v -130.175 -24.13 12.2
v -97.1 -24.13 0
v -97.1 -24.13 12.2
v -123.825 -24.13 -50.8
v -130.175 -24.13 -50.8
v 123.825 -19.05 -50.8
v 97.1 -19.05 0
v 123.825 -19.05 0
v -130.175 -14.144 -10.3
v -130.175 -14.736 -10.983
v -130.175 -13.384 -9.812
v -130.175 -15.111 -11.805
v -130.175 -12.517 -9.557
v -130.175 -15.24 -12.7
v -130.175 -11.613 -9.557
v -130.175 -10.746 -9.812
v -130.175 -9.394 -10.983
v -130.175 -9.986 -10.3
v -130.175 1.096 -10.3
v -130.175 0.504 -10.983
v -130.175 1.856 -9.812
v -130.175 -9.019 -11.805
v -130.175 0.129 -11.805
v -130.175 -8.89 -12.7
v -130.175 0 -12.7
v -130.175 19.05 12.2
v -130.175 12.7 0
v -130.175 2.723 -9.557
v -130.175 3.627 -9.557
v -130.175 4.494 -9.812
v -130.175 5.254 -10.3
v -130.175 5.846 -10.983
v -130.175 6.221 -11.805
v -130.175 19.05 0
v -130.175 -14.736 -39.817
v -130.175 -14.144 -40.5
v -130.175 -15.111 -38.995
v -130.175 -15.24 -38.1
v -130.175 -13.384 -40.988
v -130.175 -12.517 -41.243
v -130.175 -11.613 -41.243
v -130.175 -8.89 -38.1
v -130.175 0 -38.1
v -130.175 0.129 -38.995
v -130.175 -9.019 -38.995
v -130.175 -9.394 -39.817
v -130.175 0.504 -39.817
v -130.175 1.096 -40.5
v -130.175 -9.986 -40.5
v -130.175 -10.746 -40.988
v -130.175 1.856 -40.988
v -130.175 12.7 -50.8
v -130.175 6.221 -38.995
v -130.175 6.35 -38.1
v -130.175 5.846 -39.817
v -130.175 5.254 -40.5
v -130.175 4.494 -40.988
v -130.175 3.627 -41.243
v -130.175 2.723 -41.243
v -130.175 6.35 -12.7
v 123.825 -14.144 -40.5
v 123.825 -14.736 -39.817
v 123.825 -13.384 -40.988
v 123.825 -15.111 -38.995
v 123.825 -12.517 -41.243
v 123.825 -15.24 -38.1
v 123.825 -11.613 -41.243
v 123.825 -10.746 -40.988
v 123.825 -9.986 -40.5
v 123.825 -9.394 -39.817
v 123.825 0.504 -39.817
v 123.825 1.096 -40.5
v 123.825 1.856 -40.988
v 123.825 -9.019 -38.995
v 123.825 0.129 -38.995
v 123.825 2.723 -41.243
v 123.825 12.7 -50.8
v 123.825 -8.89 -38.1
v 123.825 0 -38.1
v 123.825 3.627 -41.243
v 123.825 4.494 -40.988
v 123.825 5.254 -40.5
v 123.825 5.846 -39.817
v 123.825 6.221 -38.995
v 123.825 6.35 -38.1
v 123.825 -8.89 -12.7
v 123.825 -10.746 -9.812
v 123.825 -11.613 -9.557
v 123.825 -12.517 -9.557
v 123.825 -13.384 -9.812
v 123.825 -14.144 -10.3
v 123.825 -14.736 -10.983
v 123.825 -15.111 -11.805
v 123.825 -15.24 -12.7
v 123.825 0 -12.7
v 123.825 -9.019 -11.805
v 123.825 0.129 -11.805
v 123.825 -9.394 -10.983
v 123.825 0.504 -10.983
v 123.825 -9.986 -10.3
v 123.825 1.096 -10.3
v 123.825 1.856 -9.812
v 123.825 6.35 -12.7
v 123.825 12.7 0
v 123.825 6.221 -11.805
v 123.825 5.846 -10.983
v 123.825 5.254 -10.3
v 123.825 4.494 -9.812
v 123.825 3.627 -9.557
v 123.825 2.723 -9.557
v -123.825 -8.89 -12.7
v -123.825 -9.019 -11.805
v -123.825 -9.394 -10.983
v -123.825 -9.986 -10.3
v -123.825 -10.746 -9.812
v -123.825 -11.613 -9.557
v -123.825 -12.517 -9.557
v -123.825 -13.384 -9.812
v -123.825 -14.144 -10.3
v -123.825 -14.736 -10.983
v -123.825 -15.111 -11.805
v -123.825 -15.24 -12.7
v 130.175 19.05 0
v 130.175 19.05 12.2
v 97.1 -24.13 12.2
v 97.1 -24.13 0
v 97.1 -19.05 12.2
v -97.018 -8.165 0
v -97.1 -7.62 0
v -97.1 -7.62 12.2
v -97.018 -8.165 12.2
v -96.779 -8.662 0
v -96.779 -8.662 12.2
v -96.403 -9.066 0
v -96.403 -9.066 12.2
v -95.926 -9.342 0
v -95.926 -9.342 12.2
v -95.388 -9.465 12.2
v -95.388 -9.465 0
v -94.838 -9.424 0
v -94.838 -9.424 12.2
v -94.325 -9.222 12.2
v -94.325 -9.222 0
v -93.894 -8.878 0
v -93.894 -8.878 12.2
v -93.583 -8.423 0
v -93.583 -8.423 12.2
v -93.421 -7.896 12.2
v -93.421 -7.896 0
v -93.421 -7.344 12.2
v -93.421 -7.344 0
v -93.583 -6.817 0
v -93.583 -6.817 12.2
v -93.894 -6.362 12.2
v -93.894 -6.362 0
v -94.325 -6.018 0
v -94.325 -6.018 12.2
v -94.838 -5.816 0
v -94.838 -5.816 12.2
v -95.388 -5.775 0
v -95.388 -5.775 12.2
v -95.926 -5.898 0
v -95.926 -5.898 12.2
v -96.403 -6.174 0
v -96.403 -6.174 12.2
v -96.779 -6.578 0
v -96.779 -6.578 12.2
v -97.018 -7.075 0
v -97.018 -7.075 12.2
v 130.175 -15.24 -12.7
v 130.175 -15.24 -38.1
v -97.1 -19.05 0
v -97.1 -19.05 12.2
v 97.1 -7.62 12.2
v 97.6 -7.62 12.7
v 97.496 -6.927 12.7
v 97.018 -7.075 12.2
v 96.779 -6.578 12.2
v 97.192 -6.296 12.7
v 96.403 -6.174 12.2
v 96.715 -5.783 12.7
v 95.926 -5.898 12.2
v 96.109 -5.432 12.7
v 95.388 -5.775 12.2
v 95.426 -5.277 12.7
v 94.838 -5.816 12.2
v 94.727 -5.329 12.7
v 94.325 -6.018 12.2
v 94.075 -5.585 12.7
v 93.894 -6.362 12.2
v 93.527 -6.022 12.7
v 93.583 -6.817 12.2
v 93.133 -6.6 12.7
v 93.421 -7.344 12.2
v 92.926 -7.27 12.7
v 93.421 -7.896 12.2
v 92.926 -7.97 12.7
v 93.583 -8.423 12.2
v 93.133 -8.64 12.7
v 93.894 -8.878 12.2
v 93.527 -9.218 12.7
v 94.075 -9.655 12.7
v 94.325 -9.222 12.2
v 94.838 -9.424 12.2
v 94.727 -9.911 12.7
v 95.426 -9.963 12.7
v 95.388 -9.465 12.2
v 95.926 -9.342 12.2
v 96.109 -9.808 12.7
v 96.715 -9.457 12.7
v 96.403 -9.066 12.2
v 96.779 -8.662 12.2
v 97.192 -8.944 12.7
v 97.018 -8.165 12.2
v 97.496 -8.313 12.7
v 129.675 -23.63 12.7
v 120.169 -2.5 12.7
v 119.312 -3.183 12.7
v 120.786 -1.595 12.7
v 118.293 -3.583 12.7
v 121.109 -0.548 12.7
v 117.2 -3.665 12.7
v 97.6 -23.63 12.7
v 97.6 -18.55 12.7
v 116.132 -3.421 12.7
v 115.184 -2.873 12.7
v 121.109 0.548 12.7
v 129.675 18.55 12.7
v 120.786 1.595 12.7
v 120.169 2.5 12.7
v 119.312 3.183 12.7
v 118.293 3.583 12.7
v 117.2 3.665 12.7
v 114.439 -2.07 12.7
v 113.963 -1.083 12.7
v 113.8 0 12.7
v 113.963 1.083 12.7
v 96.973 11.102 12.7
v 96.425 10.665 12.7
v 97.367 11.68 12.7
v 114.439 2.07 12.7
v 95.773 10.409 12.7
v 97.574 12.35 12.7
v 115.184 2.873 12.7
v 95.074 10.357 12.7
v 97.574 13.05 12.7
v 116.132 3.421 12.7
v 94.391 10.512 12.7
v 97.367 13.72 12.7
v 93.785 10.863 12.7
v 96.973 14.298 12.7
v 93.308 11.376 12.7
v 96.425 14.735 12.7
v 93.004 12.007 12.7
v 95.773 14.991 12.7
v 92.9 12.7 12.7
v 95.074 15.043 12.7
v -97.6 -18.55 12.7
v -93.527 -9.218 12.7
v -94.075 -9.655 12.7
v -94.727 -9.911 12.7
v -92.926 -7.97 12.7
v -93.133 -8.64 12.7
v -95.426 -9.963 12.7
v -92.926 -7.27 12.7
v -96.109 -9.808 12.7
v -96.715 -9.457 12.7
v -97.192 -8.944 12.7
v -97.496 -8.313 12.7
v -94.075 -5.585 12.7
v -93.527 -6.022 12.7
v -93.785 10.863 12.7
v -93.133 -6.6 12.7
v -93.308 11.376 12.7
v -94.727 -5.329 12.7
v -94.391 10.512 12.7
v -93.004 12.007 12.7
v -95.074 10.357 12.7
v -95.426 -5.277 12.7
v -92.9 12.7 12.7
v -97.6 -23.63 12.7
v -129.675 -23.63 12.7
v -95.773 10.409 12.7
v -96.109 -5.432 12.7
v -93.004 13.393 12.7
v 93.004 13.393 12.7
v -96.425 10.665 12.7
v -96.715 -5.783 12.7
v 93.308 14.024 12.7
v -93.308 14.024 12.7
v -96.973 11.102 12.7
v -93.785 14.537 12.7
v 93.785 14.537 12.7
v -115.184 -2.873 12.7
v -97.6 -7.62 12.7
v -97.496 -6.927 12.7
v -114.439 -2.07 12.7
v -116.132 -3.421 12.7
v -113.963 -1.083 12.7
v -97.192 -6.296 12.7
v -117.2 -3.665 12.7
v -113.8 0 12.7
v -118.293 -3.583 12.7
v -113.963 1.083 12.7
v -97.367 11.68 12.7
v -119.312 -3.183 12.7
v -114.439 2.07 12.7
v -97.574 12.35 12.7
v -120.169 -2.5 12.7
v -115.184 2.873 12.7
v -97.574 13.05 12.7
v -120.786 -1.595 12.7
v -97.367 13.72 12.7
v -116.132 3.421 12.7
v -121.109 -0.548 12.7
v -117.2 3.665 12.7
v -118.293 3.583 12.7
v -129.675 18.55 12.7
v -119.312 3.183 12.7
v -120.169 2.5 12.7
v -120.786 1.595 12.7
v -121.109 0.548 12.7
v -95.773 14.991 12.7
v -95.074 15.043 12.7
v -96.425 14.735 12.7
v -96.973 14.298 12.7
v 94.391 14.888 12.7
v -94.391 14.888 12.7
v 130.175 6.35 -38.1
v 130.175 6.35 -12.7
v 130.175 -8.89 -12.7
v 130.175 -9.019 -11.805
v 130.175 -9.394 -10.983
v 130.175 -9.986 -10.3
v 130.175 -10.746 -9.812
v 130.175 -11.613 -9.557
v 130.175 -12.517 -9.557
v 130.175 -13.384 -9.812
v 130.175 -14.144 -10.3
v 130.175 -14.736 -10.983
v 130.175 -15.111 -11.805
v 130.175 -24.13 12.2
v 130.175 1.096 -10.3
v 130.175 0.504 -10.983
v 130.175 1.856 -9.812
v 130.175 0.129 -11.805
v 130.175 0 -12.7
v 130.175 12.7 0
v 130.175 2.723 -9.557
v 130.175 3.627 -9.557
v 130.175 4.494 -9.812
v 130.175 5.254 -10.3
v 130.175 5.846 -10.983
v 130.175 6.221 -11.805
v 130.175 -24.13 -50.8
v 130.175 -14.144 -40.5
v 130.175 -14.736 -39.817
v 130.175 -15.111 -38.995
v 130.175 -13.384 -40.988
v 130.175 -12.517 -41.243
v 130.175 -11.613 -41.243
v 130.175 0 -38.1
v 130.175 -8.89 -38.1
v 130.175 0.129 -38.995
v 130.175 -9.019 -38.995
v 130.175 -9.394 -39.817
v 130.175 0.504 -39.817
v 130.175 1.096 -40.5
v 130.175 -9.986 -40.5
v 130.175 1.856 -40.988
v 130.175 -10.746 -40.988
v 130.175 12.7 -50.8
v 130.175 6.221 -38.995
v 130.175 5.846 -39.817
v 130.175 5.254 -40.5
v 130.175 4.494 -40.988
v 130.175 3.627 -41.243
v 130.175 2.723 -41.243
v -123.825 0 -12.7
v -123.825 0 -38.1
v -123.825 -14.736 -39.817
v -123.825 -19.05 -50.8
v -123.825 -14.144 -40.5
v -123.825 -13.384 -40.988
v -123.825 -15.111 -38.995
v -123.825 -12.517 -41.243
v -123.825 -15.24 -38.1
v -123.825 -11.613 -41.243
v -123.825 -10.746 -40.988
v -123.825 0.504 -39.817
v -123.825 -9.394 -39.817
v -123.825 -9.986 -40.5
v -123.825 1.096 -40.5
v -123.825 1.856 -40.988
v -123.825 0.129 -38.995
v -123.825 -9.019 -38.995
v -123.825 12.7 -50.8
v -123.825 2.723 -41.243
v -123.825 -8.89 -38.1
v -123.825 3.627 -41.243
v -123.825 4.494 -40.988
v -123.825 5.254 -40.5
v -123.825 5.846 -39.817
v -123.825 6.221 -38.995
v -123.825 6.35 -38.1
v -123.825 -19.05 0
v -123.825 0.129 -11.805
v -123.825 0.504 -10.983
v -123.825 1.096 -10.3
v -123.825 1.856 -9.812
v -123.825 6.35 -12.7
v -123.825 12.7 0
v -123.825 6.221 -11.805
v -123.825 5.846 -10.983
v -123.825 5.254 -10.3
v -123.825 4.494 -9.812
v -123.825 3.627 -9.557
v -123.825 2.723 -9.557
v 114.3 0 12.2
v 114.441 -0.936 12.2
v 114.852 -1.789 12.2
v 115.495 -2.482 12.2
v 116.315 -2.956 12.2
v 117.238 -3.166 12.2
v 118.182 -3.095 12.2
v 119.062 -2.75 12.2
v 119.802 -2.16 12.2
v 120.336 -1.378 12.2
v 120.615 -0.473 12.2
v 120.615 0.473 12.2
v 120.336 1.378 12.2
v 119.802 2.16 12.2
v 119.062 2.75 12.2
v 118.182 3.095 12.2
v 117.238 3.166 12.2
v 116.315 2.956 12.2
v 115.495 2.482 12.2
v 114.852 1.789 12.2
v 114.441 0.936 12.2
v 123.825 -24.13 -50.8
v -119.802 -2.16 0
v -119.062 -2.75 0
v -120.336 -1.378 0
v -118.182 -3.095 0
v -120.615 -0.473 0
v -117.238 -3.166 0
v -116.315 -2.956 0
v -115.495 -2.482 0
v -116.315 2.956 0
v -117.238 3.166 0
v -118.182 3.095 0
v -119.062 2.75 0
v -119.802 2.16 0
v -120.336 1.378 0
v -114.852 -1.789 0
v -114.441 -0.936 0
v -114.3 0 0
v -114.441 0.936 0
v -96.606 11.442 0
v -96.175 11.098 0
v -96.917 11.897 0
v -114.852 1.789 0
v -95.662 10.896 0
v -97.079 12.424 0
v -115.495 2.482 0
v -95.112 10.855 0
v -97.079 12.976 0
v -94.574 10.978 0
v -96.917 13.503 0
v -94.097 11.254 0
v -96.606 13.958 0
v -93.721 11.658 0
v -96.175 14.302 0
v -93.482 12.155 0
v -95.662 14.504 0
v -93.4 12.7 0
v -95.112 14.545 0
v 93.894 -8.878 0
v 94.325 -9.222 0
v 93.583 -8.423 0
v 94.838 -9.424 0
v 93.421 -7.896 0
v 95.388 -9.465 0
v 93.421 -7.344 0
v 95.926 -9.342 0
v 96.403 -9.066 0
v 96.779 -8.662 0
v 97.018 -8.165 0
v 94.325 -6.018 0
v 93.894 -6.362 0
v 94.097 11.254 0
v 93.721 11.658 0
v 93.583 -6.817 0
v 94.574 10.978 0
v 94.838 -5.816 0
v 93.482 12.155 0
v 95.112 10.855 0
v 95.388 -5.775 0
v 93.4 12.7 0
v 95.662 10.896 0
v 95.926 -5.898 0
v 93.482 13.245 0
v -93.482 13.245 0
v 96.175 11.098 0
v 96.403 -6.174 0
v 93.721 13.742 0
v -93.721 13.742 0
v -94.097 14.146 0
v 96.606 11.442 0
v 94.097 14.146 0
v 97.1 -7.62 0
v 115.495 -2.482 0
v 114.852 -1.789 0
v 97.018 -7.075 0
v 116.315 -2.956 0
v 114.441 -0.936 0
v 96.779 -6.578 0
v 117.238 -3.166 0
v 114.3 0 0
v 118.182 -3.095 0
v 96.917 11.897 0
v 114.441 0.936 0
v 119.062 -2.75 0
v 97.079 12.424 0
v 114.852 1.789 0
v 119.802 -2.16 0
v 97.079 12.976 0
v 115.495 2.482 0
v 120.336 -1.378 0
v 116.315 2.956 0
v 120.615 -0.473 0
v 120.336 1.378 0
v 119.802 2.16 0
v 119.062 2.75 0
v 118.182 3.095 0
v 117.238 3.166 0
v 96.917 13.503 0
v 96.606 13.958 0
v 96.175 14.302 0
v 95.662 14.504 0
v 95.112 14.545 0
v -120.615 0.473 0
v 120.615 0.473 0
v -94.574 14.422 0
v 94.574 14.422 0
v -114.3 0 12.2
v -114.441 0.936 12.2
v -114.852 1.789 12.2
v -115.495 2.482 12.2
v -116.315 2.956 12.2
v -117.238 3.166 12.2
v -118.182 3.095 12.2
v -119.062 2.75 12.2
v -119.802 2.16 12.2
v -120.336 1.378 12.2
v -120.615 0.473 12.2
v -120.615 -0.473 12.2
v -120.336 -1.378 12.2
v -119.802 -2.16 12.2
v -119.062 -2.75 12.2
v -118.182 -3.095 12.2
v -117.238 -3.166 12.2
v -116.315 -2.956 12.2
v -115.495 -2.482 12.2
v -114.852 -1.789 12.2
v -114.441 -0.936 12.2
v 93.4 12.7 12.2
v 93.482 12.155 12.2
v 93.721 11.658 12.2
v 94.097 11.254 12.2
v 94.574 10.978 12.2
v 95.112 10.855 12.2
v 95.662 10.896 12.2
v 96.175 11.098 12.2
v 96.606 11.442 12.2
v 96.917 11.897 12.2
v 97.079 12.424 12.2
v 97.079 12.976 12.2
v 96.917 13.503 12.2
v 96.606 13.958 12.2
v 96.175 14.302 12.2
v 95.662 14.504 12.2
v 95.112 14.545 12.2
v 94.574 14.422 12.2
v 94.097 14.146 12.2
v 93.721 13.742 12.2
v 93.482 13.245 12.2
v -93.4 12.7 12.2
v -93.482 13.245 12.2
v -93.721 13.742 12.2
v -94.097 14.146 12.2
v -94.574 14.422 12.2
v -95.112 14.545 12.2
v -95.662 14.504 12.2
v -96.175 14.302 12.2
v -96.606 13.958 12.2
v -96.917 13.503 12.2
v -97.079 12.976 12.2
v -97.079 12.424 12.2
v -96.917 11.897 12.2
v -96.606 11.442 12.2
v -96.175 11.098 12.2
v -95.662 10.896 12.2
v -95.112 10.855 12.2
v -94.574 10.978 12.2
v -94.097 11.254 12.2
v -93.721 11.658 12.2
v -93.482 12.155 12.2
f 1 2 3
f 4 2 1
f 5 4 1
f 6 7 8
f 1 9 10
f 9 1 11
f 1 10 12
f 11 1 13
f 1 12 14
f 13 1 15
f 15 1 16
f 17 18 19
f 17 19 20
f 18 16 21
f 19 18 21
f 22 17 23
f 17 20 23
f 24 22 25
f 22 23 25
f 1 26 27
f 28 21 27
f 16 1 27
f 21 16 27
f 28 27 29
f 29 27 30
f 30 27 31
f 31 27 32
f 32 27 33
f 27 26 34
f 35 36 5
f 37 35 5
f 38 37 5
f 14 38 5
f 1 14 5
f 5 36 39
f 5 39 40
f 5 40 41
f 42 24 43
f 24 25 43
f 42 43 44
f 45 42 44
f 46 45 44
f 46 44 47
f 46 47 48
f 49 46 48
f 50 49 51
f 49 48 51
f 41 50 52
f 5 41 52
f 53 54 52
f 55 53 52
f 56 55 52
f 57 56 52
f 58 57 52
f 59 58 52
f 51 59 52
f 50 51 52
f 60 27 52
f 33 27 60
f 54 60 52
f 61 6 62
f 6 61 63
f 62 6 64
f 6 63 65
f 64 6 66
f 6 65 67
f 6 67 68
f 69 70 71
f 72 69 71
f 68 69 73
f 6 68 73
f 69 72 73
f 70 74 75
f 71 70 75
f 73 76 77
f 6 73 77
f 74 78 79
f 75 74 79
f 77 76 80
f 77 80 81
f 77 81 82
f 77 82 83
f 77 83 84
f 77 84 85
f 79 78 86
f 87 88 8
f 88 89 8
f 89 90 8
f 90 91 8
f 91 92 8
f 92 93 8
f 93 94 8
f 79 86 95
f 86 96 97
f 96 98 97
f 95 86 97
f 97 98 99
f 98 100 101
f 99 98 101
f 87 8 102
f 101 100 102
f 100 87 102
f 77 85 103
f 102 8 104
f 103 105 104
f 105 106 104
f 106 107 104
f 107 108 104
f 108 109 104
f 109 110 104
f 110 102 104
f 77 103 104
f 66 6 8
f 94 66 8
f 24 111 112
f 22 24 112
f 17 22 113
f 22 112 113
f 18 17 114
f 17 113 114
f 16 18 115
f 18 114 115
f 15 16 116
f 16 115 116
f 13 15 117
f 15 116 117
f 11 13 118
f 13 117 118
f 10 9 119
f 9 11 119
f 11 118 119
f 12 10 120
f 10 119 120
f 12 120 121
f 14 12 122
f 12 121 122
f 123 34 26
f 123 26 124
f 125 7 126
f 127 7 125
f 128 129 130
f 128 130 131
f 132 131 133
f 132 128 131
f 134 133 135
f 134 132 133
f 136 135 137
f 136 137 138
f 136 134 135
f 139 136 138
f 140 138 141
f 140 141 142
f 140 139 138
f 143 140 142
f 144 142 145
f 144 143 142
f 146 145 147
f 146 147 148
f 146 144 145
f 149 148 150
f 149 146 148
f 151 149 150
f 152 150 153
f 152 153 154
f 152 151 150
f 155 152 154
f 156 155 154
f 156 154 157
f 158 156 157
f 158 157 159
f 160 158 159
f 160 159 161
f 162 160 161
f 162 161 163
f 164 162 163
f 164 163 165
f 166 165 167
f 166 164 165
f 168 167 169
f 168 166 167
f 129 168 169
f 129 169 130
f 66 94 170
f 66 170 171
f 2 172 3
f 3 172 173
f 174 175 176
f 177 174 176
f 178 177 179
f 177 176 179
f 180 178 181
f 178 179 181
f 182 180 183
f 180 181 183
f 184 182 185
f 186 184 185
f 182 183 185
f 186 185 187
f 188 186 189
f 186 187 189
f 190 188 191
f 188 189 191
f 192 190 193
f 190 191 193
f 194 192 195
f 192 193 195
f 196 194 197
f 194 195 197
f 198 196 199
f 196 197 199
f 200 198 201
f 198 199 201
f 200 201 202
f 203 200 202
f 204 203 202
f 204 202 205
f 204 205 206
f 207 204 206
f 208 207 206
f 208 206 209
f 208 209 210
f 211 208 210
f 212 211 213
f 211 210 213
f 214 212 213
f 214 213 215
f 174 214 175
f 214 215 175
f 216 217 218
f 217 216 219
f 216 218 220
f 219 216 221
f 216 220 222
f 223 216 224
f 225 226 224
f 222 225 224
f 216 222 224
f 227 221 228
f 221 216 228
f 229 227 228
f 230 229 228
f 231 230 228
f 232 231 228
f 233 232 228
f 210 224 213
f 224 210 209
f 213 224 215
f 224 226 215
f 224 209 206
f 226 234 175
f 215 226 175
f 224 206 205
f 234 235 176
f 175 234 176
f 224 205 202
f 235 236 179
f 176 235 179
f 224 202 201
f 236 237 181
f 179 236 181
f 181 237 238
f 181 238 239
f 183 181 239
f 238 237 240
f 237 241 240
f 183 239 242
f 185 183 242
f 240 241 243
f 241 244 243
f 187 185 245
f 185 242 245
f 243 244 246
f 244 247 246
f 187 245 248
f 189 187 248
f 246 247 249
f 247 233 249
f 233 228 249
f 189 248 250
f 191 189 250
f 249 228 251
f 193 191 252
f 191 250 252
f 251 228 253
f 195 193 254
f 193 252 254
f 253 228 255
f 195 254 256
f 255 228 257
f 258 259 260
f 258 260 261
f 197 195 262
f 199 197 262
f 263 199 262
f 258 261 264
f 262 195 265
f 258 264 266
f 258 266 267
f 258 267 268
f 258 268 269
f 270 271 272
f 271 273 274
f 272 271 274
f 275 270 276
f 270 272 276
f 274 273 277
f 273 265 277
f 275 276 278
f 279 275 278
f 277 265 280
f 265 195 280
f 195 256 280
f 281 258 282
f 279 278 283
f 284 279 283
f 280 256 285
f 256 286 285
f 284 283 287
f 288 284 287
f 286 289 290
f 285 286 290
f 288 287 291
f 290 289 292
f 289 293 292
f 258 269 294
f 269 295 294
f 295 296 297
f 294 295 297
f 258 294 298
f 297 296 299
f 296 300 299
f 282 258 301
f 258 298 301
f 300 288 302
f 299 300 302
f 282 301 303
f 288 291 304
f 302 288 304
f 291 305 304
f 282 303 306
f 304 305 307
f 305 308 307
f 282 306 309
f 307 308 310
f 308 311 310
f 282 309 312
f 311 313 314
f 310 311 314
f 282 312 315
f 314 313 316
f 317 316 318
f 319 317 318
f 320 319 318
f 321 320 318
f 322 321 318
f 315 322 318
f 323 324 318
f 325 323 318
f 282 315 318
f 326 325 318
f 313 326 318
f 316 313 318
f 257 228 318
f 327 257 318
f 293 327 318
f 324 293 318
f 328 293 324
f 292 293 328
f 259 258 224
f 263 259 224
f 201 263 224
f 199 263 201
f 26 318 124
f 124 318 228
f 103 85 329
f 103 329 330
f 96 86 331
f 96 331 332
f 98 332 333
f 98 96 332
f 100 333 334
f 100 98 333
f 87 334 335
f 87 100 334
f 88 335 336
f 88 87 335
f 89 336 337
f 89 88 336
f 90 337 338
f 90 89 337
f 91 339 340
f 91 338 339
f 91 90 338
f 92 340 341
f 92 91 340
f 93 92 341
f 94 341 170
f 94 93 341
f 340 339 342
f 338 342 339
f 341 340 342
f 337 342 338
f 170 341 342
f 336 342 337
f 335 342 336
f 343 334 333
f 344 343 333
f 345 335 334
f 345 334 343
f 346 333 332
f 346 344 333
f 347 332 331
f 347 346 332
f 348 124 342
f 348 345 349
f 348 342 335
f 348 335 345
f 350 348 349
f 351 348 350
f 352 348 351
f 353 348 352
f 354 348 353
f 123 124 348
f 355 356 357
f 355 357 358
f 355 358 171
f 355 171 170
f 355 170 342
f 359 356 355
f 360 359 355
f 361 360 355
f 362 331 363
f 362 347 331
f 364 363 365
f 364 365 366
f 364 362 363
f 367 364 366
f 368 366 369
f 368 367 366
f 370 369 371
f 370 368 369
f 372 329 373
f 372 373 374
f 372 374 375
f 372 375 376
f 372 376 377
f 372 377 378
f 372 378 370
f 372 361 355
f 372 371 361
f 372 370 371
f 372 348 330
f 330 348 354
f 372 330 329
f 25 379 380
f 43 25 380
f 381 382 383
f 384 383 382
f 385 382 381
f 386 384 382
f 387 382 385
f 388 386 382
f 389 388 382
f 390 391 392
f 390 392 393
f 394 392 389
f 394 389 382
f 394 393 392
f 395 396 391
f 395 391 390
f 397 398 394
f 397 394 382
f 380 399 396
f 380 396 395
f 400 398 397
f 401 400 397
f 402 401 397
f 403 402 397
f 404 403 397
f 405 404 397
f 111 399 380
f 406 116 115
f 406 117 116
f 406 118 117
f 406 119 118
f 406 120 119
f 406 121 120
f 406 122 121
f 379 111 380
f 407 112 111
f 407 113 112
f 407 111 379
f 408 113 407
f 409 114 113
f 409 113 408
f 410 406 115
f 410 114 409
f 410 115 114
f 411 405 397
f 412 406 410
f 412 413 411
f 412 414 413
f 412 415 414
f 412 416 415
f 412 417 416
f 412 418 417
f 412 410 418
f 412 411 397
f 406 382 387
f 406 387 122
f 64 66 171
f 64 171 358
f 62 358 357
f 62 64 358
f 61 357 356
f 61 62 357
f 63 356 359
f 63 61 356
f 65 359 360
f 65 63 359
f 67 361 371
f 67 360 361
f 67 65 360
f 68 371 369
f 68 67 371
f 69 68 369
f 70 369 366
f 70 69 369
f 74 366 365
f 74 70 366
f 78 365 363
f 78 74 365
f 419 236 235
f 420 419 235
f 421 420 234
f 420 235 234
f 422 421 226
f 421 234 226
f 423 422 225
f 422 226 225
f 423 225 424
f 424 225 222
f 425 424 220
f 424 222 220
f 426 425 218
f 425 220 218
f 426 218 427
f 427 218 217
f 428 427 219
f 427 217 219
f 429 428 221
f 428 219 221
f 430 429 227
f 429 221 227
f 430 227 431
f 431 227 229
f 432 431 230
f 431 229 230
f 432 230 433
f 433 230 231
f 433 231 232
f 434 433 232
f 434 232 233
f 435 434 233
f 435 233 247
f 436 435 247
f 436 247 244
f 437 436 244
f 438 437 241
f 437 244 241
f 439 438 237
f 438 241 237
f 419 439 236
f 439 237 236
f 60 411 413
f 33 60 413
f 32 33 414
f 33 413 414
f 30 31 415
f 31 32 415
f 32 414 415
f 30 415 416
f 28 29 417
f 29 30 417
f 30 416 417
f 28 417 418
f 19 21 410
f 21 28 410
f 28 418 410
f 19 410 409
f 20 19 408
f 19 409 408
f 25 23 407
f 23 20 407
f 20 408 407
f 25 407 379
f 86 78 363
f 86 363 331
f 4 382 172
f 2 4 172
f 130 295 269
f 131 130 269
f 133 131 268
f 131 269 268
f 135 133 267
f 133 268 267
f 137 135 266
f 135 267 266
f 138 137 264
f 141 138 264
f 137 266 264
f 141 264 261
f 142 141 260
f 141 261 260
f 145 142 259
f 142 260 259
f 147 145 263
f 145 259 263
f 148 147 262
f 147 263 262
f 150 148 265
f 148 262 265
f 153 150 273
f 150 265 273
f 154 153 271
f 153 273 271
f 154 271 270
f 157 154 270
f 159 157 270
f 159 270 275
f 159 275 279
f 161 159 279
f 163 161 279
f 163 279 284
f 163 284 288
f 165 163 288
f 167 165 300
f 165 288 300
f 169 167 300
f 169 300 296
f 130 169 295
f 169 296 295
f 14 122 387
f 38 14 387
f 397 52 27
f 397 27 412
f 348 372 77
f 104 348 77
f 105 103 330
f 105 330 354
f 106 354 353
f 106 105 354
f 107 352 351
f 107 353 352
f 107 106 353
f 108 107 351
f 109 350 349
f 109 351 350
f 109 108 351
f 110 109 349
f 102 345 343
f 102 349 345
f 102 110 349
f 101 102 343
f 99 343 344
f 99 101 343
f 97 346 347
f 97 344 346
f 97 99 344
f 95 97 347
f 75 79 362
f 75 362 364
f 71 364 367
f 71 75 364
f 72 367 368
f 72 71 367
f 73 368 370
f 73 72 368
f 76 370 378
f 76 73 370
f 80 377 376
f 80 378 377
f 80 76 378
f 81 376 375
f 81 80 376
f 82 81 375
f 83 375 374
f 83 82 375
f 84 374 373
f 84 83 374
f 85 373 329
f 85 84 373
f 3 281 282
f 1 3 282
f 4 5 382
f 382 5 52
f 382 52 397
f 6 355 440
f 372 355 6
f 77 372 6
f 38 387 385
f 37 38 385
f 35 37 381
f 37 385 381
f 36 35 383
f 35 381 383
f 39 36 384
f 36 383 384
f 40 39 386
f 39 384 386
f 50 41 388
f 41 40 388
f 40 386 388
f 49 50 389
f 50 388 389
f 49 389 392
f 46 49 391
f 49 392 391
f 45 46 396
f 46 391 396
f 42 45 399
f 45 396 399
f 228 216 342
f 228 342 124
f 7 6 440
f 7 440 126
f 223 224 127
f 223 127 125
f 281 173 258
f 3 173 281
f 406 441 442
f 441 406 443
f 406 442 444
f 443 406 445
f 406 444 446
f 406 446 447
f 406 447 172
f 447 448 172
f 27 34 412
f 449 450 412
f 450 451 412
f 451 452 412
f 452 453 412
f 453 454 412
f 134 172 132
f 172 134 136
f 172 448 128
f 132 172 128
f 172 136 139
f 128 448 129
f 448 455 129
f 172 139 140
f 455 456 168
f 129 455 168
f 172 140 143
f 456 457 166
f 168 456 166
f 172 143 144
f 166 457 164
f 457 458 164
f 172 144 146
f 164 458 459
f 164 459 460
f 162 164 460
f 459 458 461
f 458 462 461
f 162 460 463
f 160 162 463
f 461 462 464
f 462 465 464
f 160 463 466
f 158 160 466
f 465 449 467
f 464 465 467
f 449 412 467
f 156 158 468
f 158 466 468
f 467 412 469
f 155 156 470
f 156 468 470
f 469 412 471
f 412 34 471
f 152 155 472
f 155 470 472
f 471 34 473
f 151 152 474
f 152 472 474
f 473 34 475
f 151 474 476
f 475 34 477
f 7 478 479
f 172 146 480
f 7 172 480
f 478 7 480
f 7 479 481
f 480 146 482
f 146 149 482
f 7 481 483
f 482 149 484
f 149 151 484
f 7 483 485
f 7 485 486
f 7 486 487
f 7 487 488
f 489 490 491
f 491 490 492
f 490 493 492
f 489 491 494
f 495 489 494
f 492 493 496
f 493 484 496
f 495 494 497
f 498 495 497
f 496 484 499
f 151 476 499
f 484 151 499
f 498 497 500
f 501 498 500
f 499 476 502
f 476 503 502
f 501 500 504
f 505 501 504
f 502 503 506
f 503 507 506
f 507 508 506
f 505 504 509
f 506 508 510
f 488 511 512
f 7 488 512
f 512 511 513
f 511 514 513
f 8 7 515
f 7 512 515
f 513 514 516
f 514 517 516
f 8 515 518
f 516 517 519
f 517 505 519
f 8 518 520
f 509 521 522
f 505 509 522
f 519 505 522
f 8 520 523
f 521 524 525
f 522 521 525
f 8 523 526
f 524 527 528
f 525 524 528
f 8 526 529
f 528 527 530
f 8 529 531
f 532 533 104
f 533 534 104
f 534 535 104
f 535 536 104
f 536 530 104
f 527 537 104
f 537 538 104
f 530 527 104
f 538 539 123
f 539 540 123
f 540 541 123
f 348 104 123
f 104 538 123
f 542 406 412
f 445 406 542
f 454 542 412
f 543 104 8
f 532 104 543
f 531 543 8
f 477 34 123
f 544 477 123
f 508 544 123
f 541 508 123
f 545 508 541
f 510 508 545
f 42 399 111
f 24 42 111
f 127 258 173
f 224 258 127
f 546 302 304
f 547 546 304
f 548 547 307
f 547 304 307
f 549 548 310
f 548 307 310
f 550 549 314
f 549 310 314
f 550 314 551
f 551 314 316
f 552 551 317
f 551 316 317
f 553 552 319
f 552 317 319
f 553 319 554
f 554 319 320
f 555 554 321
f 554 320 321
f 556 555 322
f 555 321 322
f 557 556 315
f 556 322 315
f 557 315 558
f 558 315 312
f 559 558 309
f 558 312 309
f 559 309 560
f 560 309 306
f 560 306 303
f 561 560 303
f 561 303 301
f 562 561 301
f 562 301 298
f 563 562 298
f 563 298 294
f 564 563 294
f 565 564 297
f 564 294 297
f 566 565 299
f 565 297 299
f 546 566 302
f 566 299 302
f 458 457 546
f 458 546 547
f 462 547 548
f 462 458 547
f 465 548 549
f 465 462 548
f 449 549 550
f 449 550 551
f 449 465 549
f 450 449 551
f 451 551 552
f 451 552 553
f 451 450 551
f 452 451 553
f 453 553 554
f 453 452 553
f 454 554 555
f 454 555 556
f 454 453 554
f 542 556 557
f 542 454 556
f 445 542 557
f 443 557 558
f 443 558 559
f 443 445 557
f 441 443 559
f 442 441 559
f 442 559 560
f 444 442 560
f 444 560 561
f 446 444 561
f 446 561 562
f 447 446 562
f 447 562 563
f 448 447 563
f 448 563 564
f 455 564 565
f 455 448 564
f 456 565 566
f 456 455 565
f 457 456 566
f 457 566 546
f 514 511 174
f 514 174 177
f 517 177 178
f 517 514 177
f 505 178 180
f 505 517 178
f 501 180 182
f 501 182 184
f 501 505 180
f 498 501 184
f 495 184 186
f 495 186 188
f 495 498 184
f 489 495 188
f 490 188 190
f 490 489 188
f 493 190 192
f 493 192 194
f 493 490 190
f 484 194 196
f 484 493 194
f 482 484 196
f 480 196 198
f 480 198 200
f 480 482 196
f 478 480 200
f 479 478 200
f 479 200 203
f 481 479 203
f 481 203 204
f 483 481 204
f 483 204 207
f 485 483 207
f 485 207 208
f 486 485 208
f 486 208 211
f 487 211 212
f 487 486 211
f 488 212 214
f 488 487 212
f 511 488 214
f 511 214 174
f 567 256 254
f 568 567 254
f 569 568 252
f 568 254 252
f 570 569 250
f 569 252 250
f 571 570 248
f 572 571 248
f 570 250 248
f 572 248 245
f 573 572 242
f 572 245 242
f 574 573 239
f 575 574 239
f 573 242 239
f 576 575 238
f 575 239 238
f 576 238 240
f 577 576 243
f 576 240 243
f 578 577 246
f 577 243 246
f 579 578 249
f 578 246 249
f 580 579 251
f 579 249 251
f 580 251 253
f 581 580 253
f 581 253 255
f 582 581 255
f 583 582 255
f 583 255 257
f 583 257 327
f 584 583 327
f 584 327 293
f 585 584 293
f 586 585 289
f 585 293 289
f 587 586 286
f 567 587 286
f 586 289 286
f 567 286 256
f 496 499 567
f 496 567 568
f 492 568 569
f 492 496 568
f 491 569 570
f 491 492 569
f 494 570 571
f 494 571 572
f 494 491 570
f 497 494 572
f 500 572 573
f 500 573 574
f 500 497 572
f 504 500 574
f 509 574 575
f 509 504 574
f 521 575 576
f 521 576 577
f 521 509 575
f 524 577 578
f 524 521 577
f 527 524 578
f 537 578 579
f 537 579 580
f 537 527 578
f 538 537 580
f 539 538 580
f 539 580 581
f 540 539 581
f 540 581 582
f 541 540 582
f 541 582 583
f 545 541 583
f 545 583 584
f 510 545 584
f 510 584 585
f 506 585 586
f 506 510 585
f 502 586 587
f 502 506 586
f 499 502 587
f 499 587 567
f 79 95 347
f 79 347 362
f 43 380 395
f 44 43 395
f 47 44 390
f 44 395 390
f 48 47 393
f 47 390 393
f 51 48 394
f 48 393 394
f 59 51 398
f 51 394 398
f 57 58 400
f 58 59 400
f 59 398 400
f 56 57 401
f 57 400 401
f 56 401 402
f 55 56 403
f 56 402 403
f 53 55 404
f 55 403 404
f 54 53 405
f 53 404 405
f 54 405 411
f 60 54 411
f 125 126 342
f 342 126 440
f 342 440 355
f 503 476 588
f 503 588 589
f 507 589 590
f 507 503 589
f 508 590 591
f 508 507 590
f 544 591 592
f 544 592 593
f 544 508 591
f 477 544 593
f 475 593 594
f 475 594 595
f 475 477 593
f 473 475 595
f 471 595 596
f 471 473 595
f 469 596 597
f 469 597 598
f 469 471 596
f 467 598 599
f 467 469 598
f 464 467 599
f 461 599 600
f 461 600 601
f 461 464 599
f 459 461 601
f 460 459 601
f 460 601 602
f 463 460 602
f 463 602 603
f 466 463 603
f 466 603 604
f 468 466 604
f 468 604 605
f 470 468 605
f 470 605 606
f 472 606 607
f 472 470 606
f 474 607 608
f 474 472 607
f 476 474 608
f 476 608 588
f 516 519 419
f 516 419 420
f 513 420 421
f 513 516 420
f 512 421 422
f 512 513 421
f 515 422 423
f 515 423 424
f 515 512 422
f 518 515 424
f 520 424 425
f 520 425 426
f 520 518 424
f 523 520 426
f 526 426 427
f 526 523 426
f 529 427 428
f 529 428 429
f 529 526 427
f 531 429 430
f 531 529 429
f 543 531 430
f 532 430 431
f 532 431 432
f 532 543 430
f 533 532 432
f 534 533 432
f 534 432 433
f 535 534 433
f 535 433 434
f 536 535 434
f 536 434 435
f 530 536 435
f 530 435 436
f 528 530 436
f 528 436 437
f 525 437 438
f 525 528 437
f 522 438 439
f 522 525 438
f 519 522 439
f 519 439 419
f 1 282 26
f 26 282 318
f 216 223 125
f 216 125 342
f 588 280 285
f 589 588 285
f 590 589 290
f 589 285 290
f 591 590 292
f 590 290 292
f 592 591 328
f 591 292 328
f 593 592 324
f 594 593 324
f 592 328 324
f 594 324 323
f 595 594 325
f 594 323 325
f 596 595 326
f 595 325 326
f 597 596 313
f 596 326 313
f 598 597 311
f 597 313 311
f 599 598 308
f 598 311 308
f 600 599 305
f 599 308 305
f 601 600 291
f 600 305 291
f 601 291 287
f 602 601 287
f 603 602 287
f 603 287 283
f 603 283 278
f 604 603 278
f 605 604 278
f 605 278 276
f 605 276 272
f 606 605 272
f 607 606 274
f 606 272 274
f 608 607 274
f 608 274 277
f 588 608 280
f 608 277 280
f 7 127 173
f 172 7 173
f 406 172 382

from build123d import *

# Parameters (mm, degrees)
SKETCH1_W           = 260.35
SKETCH1_H           = 38.1
SKETCH1_R           = 3.175
SKETCH1_R_2         = 1.85
BOSS_EXTRUDE1_DEPTH = 12.7
SKETCH2_W           = 6.35
SKETCH2_H           = 31.75
BOSS_EXTRUDE2_DEPTH = 50.8
CUT_EXTRUDE1_DEPTH  = 50.8
BOSS_EXTRUDE3_DEPTH = 5.08
CHAMFER1_SIZE       = 0.5


with BuildPart() as part:
    # Sketch1 → Boss-Extrude1 (new body)
    with BuildSketch(Plane.XY):
        Rectangle(SKETCH1_W, SKETCH1_H)
        with Locations((-117.475, 0)):
            Circle(SKETCH1_R, mode=Mode.SUBTRACT)
        with Locations((117.475, 0)):
            Circle(SKETCH1_R, mode=Mode.SUBTRACT)
        with Locations((-95.25, 12.7)):
            Circle(SKETCH1_R_2, mode=Mode.SUBTRACT)
        with Locations((-95.25, -7.62)):
            Circle(SKETCH1_R_2, mode=Mode.SUBTRACT)
        with Locations((95.25, -7.62)):
            Circle(SKETCH1_R_2, mode=Mode.SUBTRACT)
        with Locations((95.25, 12.7)):
            Circle(SKETCH1_R_2, mode=Mode.SUBTRACT)
    boss_extrude1 = extrude(amount=BOSS_EXTRUDE1_DEPTH)

    # Sketch2 → Boss-Extrude2 (add)
    with BuildSketch(Plane(origin=(0, 0, 0), x_dir=(-1, 0, 0), z_dir=(0, 0, -1))):
        with Locations((-127, -3.175)):
            Rectangle(SKETCH2_W, SKETCH2_H)
    boss_extrude2 = extrude(amount=BOSS_EXTRUDE2_DEPTH)

    # Sketch3 → Cut-Extrude1 (cut)
    with BuildSketch(Plane.ZY.offset(-123.825)):
        with BuildLine():
            Line((-38.1, 6.35), (-12.7, 6.35))
            ThreePointArc((-12.7, 6.35), (-9.525, 3.175), (-12.7, 0))
            Line((-12.7, 0), (-38.1, 0))
            ThreePointArc((-38.1, 0), (-41.275, 3.175), (-38.1, 6.35))
        make_face()
        with BuildLine():
            Line((-38.1, -8.89), (-12.7, -8.89))
            ThreePointArc((-12.7, -8.89), (-9.525, -12.065), (-12.7, -15.24))
            Line((-12.7, -15.24), (-38.1, -15.24))
            ThreePointArc((-38.1, -15.24), (-41.275, -12.065), (-38.1, -8.89))
        make_face()
    cut_extrude1 = extrude(amount=-CUT_EXTRUDE1_DEPTH, mode=Mode.SUBTRACT)

    # Sketch4 → Boss-Extrude3 (add)
    with BuildSketch(Plane(origin=(0, -19.05, 0), x_dir=(-1, 0, 0), z_dir=(0, -1, 0))):
        Polygon((-123.825, 50.8), (-97.1, 0), (-97.1, -12.7), (-130.175, -12.7), (-130.175, 50.8), align=None)
    boss_extrude3 = extrude(amount=BOSS_EXTRUDE3_DEPTH)

    # Mirror1: Boss-Extrude1, Boss-Extrude2, Cut-Extrude1, Boss-Extrude3 across plane
    add(boss_extrude1.mirror(Plane(origin=(0, 0, 0), x_dir=(0, 0, 1), z_dir=(1, 0, 0))))
    add(boss_extrude2.mirror(Plane(origin=(0, 0, 0), x_dir=(0, 0, 1), z_dir=(1, 0, 0))))
    add(cut_extrude1.mirror(Plane(origin=(0, 0, 0), x_dir=(0, 0, 1), z_dir=(1, 0, 0))), mode=Mode.SUBTRACT)
    add(boss_extrude3.mirror(Plane(origin=(0, 0, 0), x_dir=(0, 0, 1), z_dir=(1, 0, 0))))

    # Chamfer1
    chamfer1_edges = [part.edges().sort_by_distance(p)[0] for p in [
        (93.4, 12.7, 12.7),
        (-97.1, 12.7, 12.7),
        (114.3, 0, 12.7),
        (-120.65, 0, 12.7),
        (-97.1, -7.62, 12.7),
        (93.4, -7.62, 12.7),
        (113.6375, -24.13, 12.7),
        (97.1, -21.59, 12.7),
        (0, -19.05, 12.7),
        (-97.1, -21.59, 12.7),
        (-113.6375, -24.13, 12.7),
        (-130.175, -2.54, 12.7),
        (0, 19.05, 12.7),
        (130.175, -2.54, 12.7),
    ]]
    chamfer(chamfer1_edges, length=CHAMFER1_SIZE)


solid = part.part
